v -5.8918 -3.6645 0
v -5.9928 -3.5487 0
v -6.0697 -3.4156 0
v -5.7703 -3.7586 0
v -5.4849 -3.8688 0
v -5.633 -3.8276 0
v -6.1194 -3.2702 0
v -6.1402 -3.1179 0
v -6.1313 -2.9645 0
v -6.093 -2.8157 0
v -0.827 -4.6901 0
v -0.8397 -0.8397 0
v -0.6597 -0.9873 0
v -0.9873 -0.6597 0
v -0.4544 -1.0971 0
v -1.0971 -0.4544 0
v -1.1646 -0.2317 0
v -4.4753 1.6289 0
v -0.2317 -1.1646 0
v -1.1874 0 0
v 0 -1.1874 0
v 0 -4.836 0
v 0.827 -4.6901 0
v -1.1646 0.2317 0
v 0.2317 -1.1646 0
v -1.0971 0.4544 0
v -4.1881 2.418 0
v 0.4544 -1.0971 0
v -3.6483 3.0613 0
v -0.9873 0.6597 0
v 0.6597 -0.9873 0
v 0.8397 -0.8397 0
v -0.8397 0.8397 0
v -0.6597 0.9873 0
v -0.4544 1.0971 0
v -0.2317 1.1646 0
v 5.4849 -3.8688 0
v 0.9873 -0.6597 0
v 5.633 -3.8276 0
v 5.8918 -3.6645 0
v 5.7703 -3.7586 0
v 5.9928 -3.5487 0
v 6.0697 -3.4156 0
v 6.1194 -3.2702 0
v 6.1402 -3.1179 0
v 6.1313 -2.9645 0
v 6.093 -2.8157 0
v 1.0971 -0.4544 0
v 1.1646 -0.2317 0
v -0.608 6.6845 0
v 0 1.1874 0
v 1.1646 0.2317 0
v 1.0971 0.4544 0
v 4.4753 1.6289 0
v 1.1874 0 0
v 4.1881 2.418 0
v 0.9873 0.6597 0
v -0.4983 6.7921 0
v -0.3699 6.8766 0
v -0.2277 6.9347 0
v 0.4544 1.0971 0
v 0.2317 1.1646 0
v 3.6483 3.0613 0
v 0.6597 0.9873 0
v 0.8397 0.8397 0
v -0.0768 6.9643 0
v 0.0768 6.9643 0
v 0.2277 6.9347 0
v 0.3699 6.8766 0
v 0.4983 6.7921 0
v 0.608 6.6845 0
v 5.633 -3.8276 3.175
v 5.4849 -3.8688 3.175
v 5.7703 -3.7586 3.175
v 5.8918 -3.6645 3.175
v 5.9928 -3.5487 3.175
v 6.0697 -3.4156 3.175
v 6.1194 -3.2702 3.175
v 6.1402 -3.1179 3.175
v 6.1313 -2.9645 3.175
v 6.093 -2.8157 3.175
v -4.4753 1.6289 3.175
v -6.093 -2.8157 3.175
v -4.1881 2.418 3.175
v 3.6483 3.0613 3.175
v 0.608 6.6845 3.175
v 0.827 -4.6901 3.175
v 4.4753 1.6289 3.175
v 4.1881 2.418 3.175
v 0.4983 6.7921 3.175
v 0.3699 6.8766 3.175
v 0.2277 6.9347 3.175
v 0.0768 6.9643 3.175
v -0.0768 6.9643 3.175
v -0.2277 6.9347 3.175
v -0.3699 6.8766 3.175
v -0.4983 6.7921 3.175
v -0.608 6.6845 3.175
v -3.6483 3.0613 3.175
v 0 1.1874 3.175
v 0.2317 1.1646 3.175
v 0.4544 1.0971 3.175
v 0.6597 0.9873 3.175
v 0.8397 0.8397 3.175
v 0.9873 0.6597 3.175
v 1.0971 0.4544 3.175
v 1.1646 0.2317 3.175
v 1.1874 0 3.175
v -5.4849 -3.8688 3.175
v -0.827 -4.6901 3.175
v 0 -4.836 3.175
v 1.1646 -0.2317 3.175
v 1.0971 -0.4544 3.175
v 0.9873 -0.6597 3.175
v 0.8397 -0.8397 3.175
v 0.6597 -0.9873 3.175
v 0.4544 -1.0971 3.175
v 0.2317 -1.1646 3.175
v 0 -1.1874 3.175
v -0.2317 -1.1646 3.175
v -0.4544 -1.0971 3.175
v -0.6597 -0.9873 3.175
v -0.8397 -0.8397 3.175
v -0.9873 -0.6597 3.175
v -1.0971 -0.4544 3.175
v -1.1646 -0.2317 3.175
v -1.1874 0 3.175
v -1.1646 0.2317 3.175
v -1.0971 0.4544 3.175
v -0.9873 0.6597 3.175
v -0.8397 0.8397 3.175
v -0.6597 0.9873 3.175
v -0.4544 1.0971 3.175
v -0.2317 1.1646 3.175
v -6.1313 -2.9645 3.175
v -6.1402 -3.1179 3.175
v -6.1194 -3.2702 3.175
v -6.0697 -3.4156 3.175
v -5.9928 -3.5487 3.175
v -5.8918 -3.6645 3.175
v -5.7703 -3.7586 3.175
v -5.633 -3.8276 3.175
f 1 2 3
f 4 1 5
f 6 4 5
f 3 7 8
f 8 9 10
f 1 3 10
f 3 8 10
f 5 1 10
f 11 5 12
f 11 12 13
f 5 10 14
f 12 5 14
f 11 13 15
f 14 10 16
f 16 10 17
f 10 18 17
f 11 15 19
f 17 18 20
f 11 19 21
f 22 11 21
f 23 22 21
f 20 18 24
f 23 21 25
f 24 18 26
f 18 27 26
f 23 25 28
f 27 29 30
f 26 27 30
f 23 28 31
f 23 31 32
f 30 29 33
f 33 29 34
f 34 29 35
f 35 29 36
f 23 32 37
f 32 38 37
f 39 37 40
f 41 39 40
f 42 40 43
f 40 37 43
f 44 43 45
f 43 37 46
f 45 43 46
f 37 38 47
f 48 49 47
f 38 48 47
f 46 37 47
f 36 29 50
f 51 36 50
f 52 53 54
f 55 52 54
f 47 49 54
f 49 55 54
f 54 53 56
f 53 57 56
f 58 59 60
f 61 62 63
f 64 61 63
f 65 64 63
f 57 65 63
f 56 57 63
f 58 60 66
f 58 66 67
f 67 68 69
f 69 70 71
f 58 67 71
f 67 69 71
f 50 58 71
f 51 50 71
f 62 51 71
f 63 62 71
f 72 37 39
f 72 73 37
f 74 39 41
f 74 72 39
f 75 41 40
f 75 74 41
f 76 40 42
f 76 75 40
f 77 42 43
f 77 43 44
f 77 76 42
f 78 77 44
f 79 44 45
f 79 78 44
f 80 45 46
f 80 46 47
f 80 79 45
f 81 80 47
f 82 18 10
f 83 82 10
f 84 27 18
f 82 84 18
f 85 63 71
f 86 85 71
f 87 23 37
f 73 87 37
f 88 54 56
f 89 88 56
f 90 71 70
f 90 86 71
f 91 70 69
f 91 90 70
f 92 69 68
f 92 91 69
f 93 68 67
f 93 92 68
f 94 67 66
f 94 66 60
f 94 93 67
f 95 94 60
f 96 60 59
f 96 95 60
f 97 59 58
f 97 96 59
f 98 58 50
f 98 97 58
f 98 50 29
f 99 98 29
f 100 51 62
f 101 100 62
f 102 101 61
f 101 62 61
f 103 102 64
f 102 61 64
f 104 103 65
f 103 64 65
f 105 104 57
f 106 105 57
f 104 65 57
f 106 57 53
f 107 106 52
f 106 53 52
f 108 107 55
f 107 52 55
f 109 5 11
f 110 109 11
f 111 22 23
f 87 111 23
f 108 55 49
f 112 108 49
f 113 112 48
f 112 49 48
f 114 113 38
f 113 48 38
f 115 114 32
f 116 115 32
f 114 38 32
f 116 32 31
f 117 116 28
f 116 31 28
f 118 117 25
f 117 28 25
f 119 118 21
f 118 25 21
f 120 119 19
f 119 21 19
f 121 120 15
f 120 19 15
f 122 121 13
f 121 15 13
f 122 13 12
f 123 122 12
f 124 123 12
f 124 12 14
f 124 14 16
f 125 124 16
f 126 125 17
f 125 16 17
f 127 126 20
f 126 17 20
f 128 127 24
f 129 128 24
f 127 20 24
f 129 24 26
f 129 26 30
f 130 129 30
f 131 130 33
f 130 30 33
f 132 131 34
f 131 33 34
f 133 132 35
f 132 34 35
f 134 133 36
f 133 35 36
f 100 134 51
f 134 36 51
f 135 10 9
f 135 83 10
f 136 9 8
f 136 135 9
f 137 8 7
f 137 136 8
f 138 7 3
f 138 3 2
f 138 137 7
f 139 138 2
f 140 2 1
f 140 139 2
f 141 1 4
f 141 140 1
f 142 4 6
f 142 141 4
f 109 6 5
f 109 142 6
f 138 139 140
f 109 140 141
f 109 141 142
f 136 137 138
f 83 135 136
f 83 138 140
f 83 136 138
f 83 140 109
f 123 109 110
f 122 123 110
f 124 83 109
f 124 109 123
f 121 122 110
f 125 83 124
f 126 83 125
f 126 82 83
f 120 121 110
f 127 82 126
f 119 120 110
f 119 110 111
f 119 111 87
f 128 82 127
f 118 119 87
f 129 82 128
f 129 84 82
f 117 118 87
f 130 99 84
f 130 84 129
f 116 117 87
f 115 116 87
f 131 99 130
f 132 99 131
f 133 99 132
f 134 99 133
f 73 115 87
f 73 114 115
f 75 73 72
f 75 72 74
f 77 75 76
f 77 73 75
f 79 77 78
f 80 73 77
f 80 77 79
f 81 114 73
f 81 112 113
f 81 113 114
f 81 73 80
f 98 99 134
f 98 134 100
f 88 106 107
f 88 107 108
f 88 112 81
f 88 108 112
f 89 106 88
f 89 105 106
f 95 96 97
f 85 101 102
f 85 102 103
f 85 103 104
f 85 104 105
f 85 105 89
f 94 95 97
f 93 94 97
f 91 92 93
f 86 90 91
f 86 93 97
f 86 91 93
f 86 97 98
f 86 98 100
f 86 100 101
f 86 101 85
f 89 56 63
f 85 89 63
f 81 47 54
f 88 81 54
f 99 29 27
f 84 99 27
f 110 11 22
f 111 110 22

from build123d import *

# Parameters (mm, degrees)
F1_DEPTH = 3.175
F2_R     = 0.79375


with BuildPart() as f1:
    # F0 (on Top) → F1 (new body)
    with BuildSketch(Plane.XY):
        with BuildLine():
            ThreePointArc((0, 4.7625), (2.0127194988, 4.316290823), (3.648286699, 3.061275945))
            Line((3.648286699, 3.061275945), (0, 7.4091347254))
            Line((0, 7.4091347254), (0, 4.7625))
        make_face()
        with BuildLine():
            ThreePointArc((-3.6482866444, 3.0612760102), (-2.0127194603, 4.316290841), (0, 4.7625))
            Line((0, 4.7625), (0, 7.4091347254))
            Line((0, 7.4091347254), (-3.6482866444, 3.0612760102))
        make_face()
        with BuildLine():
            ThreePointArc((0.8269994491, -4.6901469232), (3.6482866613, -3.06127599), (4.7625, 0))
            ThreePointArc((4.7625, 0), (4.6901469251, 0.8269994386), (4.4752861117, 1.6288709182))
            ThreePointArc((4.4752861117, 1.6288709182), (4.1244460044, 2.3812499673), (3.648286699, 3.061275945))
            ThreePointArc((3.648286699, 3.061275945), (2.0127194988, 4.316290823), (0, 4.7625))
            ThreePointArc((0, 4.7625), (-2.0127194603, 4.316290841), (-3.6482866444, 3.0612760102))
            ThreePointArc((-3.6482866444, 3.0612760102), (-4.1244459867, 2.3812499979), (-4.4752861166, 1.6288709047))
            ThreePointArc((-4.4752861166, 1.6288709047), (-4.1244459762, -2.3812500162), (-0.8269994386, -4.6901469251))
            ThreePointArc((-0.8269994386, -4.6901469251), (5.3e-09, -4.7625), (0.8269994491, -4.6901469232))
        make_face()
        with BuildLine():
            ThreePointArc((1.18745, 0), (-0.8396539473, -0.8396539473), (0, 1.18745))
            ThreePointArc((0, 1.18745), (0.8396539473, 0.8396539473), (1.18745, 0))
        make_face(mode=Mode.SUBTRACT)
        with BuildLine():
            ThreePointArc((4.4752861117, 1.6288709182), (4.6901469251, 0.8269994386), (4.7625, 0))
            ThreePointArc((4.7625, 0), (3.6482866613, -3.06127599), (0.8269994491, -4.6901469232))
            Line((0.8269994491, -4.6901469232), (6.4164988923, -3.7045673627))
            Line((6.4164988923, -3.7045673627), (4.4752861117, 1.6288709182))
        make_face()
        with BuildLine():
            Line((-6.4164988923, -3.7045673627), (-0.8269994386, -4.6901469251))
            ThreePointArc((-0.8269994386, -4.6901469251), (-4.1244459762, -2.3812500162), (-4.4752861166, 1.6288709047))
            Line((-4.4752861166, 1.6288709047), (-6.4164988923, -3.7045673627))
        make_face()
        with BuildLine():
            ThreePointArc((3.648286699, 3.061275945), (4.1244460044, 2.3812499673), (4.4752861117, 1.6288709182))
            Line((4.4752861117, 1.6288709182), (4.188072213, 2.4179846196))
            Line((4.188072213, 2.4179846196), (3.648286699, 3.061275945))
        make_face()
        with BuildLine():
            Line((-4.188072213, 2.4179846196), (-4.4752861166, 1.6288709047))
            ThreePointArc((-4.4752861166, 1.6288709047), (-4.1244459867, 2.3812499979), (-3.6482866444, 3.0612760102))
            Line((-3.6482866444, 3.0612760102), (-4.188072213, 2.4179846196))
        make_face()
        with BuildLine():
            Line((0, -4.8359692391), (0.8269994491, -4.6901469232))
            ThreePointArc((0.8269994491, -4.6901469232), (5.3e-09, -4.7625), (-0.8269994386, -4.6901469251))
            Line((-0.8269994386, -4.6901469251), (0, -4.8359692391))
        make_face()
    extrude(amount=F1_DEPTH)

    # F2
    f2_edges = [f1.edges().sort_by_distance(p)[0] for p in [
        (0, 7.409135, 1.5875),
        (-6.416499, -3.704567, 1.5875),
        (6.416499, -3.704567, 1.5875),
    ]]
    fillet(f2_edges, radius=F2_R)


solid = f1.part
